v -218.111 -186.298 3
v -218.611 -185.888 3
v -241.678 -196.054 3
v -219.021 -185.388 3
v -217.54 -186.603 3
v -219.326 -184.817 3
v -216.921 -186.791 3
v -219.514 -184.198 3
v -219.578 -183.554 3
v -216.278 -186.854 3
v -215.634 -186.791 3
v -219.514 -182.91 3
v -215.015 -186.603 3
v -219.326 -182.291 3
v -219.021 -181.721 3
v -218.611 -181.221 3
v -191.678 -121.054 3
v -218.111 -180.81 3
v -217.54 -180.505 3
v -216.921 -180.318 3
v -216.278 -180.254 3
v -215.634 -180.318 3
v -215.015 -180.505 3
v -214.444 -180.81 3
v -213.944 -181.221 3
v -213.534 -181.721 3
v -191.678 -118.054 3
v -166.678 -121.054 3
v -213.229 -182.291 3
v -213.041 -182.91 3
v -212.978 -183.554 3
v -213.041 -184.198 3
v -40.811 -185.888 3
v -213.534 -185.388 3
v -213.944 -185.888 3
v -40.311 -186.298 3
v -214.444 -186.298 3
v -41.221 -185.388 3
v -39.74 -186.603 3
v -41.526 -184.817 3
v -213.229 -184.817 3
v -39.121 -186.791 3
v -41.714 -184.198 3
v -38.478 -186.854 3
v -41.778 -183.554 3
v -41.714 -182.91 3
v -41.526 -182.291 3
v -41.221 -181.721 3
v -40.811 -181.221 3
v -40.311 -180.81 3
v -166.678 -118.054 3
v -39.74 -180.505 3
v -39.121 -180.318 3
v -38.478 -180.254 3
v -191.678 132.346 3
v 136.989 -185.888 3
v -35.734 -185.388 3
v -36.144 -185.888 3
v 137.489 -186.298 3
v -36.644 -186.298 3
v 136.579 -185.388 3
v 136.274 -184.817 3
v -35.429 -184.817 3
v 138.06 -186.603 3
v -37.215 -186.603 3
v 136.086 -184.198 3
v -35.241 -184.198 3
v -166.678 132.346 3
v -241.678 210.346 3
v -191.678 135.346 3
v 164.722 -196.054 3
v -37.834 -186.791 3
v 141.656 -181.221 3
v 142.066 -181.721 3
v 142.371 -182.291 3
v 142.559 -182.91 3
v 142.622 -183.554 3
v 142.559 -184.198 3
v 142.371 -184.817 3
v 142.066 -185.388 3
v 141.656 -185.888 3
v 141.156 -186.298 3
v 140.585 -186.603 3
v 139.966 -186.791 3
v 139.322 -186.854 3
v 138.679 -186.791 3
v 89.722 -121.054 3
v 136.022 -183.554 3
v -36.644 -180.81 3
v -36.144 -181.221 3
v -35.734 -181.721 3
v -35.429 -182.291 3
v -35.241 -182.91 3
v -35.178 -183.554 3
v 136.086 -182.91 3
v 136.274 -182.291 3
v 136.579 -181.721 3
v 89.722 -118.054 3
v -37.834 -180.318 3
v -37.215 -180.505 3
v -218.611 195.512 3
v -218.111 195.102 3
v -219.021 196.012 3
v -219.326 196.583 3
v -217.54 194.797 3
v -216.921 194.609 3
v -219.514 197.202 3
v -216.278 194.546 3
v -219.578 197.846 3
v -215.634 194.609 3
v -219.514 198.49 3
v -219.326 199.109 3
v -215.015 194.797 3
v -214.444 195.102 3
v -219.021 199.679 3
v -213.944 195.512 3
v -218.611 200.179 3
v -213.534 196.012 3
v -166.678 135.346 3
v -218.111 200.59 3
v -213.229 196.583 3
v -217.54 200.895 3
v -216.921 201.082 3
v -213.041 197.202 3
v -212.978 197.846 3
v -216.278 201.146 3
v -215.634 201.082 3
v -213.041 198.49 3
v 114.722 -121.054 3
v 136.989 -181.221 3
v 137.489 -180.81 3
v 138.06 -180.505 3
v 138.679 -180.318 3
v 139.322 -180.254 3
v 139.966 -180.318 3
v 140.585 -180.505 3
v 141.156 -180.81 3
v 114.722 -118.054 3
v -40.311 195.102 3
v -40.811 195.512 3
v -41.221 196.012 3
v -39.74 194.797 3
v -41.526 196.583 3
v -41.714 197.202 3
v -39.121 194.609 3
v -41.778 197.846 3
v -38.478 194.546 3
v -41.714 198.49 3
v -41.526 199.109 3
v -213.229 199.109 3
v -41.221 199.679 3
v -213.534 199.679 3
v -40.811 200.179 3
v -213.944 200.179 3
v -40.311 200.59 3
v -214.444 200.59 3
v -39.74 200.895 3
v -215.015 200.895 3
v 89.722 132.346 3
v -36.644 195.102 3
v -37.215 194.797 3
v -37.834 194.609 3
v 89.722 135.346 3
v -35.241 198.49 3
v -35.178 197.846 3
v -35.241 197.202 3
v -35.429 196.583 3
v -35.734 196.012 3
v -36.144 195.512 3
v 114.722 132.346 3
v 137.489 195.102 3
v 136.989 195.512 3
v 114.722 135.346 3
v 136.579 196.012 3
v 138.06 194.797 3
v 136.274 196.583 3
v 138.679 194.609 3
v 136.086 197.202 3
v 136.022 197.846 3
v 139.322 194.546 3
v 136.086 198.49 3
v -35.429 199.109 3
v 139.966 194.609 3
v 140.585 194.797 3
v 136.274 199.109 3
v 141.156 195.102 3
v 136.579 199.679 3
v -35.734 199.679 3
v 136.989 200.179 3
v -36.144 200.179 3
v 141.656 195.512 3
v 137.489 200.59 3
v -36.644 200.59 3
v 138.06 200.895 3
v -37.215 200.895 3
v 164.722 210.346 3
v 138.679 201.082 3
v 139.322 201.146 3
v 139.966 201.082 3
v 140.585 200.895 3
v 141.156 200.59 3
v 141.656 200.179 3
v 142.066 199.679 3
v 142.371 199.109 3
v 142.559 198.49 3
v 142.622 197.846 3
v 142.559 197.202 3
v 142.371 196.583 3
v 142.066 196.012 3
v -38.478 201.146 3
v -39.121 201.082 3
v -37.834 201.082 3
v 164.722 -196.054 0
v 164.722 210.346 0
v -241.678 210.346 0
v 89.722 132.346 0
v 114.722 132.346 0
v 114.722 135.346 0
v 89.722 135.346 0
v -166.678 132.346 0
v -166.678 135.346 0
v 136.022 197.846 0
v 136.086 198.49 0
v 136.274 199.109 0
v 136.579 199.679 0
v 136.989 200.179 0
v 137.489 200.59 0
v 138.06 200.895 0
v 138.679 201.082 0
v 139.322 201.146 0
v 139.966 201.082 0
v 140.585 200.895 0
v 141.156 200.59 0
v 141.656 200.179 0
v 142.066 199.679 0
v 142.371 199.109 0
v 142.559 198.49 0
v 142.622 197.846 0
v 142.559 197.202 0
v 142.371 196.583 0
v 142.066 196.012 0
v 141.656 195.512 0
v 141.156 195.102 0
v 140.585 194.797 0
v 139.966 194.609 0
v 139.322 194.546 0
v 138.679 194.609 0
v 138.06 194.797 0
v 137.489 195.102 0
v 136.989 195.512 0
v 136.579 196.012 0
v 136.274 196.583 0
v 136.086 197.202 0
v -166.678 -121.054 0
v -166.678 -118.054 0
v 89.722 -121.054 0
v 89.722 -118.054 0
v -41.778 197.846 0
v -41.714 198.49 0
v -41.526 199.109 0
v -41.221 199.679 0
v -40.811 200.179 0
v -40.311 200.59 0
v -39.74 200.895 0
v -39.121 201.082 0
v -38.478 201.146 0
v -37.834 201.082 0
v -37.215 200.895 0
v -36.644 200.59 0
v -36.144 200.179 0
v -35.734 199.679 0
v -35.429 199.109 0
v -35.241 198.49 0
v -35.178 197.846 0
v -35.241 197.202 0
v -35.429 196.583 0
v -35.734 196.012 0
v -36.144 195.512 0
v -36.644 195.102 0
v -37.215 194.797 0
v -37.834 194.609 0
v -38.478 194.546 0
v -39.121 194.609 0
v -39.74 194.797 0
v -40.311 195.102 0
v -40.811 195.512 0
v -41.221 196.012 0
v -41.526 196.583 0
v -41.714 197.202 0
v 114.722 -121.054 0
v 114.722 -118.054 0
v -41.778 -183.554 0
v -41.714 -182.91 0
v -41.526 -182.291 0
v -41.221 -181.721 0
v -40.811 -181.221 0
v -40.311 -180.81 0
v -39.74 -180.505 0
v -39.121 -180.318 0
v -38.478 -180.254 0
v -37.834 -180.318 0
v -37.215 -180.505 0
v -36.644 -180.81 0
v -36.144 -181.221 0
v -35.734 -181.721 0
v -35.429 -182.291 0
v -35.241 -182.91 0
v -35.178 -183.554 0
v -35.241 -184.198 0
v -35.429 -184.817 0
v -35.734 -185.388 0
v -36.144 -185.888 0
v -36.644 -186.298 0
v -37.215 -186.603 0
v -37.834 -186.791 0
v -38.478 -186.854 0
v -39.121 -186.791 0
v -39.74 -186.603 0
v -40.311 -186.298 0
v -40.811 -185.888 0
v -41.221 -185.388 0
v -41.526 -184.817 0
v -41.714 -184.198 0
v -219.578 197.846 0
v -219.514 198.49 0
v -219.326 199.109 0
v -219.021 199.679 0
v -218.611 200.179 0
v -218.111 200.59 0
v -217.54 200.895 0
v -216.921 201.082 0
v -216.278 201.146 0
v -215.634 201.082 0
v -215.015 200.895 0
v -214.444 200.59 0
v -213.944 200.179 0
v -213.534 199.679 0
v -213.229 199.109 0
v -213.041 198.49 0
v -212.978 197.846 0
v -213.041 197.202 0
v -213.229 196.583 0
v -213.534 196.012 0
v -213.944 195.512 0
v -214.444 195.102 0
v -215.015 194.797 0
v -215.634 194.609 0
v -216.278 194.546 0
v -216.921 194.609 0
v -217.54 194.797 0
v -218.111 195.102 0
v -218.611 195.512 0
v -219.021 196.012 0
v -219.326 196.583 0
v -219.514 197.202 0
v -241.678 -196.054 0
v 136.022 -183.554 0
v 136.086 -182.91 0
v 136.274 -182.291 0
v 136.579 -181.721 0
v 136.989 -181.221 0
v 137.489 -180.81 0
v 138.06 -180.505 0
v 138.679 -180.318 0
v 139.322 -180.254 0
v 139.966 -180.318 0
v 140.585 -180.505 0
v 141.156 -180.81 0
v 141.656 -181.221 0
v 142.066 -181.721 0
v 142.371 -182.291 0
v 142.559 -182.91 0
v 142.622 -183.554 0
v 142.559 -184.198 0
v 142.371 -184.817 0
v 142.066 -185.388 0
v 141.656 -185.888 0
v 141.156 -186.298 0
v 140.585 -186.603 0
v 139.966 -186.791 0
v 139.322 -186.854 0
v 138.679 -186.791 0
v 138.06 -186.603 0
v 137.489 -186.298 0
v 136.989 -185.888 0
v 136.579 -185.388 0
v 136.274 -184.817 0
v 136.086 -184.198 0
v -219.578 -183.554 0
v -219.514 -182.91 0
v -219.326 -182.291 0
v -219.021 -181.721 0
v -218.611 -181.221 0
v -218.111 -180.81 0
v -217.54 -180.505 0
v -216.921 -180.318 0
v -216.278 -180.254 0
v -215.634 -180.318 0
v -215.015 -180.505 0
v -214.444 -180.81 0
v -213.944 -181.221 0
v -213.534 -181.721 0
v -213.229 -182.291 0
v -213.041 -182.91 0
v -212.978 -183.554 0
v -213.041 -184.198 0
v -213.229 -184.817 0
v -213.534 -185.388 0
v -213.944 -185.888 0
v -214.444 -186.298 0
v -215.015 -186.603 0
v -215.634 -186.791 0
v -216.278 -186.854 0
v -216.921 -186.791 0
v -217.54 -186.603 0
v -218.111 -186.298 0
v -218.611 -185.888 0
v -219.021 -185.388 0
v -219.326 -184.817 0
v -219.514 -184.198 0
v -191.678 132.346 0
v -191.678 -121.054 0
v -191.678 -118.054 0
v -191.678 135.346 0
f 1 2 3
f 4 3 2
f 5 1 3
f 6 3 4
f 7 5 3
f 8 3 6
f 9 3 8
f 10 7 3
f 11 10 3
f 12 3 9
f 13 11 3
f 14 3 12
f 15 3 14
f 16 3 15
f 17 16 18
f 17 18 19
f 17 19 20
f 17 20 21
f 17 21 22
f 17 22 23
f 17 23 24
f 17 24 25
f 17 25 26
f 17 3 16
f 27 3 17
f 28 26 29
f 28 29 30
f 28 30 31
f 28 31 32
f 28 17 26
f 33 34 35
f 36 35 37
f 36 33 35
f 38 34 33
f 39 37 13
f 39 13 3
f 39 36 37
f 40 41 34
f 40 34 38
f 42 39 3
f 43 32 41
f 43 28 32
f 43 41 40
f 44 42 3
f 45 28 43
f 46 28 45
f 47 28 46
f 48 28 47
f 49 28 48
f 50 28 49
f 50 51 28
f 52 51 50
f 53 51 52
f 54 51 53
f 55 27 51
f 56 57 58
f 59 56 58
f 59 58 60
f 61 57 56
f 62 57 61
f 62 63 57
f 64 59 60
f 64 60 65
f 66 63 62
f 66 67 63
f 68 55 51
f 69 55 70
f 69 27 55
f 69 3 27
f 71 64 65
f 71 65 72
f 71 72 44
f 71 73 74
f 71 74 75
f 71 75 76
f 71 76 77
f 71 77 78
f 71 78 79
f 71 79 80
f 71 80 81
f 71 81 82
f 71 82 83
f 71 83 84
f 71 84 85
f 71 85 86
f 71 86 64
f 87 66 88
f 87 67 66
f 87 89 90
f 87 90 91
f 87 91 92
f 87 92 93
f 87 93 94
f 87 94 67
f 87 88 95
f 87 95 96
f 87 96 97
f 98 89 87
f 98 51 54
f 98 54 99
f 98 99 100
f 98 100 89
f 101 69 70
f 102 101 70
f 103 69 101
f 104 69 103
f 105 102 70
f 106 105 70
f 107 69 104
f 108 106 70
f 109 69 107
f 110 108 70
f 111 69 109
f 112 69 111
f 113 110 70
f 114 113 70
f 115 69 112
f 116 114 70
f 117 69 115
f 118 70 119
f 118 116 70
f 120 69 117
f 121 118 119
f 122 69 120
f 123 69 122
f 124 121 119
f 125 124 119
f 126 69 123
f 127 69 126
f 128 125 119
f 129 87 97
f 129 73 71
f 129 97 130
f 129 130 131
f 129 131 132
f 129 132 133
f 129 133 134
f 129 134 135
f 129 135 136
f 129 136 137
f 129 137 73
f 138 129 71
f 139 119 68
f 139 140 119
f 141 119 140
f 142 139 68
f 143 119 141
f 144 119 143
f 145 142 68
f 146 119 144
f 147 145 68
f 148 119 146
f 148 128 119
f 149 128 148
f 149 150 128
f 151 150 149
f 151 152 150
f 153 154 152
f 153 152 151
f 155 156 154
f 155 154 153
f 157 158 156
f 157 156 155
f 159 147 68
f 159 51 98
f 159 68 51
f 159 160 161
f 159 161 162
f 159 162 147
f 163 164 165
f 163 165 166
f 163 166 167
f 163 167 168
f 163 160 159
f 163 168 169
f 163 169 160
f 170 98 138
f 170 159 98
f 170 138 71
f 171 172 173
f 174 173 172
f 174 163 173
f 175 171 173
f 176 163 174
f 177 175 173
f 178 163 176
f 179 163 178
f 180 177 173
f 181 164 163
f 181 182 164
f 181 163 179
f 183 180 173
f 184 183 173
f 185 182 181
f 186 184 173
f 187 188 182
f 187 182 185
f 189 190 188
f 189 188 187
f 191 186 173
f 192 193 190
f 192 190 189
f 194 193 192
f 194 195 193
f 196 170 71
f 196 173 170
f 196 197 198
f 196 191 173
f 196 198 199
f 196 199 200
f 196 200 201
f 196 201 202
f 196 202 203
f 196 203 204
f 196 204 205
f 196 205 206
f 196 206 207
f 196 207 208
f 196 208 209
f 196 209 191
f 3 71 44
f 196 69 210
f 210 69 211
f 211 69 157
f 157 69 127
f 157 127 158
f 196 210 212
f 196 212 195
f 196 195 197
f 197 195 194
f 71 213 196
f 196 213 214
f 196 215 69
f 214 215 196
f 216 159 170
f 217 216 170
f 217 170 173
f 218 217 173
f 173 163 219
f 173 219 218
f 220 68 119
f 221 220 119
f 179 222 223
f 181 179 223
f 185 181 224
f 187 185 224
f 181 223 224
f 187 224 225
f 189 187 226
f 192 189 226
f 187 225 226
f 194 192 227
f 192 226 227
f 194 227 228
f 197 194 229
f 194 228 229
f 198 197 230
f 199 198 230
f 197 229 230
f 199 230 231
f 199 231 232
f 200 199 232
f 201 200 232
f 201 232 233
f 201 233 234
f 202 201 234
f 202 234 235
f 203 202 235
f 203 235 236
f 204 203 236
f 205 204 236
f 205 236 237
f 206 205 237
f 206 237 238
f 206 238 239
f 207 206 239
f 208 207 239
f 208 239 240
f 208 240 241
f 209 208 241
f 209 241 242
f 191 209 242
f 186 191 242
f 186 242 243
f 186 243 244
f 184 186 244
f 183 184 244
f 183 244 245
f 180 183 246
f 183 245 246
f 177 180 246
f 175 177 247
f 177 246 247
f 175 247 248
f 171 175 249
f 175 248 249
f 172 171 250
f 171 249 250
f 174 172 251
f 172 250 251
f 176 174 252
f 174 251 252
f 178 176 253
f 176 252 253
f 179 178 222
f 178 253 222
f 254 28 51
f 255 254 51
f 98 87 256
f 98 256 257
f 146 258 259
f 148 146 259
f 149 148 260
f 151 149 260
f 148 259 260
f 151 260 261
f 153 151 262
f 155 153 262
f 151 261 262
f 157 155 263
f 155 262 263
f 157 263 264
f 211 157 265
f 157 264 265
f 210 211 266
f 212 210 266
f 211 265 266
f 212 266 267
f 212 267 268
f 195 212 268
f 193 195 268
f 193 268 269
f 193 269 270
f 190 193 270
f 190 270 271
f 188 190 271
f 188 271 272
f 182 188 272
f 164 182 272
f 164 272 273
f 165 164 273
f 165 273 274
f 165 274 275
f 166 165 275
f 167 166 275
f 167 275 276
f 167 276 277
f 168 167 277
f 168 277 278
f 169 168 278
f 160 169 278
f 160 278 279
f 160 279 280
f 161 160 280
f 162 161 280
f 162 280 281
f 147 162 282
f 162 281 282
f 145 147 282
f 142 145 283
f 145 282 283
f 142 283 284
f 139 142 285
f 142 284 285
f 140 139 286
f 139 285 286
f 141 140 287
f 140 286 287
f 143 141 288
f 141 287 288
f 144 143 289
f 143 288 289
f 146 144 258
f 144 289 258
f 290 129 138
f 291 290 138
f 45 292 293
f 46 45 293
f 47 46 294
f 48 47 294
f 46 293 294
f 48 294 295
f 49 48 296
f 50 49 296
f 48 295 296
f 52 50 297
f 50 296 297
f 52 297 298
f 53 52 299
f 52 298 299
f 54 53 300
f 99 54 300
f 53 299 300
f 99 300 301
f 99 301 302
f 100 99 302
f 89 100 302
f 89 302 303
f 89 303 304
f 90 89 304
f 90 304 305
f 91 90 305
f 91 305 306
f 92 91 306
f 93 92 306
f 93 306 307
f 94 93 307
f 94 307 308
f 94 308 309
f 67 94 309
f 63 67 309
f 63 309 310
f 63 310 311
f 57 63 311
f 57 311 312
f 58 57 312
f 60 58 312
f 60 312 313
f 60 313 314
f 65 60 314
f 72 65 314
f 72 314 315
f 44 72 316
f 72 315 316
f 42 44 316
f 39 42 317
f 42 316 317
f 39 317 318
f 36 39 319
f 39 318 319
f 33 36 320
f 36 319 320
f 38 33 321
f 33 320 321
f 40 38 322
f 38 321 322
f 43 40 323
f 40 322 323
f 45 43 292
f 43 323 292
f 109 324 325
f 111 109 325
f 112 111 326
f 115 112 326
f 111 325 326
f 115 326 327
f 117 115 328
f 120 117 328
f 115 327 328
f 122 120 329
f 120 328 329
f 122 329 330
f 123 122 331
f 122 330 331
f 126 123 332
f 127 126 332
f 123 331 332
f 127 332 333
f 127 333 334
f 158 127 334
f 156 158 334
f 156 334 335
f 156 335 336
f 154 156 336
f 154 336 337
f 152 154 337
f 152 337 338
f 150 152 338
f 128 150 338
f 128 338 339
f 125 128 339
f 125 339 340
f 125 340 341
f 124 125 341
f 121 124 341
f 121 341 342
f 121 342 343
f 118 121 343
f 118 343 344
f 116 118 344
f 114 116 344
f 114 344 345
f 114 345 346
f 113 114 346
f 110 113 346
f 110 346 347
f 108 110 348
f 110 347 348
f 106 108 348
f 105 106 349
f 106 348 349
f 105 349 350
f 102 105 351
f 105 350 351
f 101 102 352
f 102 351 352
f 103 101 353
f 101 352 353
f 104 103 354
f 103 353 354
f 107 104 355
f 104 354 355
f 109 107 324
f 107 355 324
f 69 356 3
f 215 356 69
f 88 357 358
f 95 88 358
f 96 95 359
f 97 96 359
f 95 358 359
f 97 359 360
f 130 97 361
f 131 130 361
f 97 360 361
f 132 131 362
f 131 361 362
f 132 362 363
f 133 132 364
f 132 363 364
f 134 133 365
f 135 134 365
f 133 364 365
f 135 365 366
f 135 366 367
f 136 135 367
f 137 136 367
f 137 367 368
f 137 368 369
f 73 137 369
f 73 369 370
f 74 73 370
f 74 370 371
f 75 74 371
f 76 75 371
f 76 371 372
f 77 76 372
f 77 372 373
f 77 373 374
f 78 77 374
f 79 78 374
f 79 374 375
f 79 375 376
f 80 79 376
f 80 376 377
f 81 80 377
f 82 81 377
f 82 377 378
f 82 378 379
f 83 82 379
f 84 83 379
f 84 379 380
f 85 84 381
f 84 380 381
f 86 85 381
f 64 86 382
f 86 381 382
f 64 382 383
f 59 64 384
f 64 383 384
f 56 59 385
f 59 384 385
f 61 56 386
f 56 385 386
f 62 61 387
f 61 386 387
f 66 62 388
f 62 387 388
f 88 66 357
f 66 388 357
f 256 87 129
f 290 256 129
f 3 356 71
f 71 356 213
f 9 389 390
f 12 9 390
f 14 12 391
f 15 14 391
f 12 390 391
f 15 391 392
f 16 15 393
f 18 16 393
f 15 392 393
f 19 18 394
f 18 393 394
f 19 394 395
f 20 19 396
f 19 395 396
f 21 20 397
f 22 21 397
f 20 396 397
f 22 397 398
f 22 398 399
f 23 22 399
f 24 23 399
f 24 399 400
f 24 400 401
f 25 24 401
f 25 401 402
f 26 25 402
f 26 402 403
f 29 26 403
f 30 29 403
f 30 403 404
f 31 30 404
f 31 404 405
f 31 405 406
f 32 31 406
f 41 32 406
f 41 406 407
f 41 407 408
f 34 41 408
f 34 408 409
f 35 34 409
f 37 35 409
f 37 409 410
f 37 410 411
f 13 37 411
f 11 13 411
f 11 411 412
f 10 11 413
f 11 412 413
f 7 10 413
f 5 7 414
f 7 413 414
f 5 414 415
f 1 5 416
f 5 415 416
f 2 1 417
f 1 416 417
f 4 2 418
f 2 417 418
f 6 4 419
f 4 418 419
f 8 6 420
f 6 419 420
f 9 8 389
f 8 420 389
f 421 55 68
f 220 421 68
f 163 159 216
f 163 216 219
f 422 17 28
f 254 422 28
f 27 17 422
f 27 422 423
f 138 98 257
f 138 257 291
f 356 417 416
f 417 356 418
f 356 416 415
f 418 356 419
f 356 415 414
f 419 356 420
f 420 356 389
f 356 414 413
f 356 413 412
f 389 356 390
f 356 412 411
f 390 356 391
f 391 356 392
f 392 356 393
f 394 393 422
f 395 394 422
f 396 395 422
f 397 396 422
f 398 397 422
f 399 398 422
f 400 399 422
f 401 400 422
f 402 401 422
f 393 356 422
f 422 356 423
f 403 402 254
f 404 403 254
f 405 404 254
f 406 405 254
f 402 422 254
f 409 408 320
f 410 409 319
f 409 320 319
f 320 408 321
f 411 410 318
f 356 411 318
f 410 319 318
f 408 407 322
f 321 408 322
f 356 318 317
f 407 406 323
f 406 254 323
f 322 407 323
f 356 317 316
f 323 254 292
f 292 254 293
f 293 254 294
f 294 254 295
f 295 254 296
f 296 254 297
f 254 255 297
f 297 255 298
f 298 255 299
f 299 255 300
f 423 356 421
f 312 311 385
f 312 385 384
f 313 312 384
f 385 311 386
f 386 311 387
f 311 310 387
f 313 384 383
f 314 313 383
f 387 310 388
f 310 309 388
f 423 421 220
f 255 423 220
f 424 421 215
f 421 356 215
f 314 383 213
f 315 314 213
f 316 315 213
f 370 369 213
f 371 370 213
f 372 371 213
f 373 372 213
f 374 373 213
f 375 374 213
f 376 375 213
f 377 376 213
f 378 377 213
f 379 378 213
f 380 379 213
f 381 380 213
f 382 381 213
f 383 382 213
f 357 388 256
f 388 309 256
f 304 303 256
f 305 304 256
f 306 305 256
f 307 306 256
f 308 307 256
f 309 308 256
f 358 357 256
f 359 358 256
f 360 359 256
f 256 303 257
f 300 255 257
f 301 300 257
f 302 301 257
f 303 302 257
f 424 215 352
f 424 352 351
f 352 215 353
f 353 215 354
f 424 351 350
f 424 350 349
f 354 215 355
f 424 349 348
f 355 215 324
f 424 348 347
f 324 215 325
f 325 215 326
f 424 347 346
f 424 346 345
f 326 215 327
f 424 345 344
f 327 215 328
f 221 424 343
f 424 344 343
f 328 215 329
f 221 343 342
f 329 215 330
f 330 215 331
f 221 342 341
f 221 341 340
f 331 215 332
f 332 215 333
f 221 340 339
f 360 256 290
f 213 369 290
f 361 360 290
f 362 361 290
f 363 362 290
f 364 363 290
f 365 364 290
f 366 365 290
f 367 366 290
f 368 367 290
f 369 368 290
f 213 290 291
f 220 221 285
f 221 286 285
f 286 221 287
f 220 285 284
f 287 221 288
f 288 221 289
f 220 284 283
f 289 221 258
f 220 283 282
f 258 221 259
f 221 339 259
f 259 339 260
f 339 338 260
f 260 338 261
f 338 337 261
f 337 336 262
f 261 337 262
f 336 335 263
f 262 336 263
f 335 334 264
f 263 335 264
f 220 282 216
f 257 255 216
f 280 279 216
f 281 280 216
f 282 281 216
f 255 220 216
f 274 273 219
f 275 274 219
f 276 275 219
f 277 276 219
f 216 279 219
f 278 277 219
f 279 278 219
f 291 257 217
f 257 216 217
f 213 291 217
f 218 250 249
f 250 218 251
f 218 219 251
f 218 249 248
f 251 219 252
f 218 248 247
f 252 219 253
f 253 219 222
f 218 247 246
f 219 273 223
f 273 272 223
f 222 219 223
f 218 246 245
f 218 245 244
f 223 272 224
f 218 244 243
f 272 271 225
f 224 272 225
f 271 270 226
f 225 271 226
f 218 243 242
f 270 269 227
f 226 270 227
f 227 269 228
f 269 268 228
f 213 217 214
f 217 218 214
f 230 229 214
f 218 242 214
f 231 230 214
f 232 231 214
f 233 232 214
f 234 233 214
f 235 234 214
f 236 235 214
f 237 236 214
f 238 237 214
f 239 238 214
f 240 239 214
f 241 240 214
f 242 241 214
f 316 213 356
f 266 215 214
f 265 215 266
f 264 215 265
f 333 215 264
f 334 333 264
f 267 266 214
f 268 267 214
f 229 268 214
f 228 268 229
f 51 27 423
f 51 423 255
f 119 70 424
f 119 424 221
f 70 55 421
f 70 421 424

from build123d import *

# Parameters (mm, degrees)
F0_W     = 406.4
F0_H     = 406.4
F1_DEPTH = 3
F3_D     = 6.6
F4_W     = 25
F4_H     = 3
F5_DEPTH = 25


with BuildPart() as f1:
    # F0 (on Top) → F1 (new body)
    with BuildSketch(Plane.XY):
        with Locations((-38.4776114106, 7.145750549)):
            Rectangle(F0_W, F0_H)
    extrude(amount=F1_DEPTH)

    # F3 (through all)
    with Locations(Plane.XY.offset(3)):
        with Locations((-216.2776114106, 197.845750549), (-38.4776114106, 197.845750549), (139.3223885894, 197.845750549), (139.3223885894, -183.554249451), (-38.4776114106, -183.554249451), (-216.2776114106, -183.554249451)):
            Hole(F3_D / 2)

    # F4 (on face) → F5 (cut)
    with BuildSketch(Plane.XY.offset(3)):
        with Locations((-179.1776114106, 133.845750549)):
            Rectangle(F4_W, F4_H)
        with Locations((102.2223885894, 133.845750549)):
            Rectangle(F4_W, F4_H)
        with Locations((-179.1776114106, -119.554249451)):
            Rectangle(F4_W, F4_H)
        with Locations((102.2223885894, -119.554249451)):
            Rectangle(F4_W, F4_H)
    extrude(amount=-F5_DEPTH, mode=Mode.SUBTRACT)


solid = f1.part
